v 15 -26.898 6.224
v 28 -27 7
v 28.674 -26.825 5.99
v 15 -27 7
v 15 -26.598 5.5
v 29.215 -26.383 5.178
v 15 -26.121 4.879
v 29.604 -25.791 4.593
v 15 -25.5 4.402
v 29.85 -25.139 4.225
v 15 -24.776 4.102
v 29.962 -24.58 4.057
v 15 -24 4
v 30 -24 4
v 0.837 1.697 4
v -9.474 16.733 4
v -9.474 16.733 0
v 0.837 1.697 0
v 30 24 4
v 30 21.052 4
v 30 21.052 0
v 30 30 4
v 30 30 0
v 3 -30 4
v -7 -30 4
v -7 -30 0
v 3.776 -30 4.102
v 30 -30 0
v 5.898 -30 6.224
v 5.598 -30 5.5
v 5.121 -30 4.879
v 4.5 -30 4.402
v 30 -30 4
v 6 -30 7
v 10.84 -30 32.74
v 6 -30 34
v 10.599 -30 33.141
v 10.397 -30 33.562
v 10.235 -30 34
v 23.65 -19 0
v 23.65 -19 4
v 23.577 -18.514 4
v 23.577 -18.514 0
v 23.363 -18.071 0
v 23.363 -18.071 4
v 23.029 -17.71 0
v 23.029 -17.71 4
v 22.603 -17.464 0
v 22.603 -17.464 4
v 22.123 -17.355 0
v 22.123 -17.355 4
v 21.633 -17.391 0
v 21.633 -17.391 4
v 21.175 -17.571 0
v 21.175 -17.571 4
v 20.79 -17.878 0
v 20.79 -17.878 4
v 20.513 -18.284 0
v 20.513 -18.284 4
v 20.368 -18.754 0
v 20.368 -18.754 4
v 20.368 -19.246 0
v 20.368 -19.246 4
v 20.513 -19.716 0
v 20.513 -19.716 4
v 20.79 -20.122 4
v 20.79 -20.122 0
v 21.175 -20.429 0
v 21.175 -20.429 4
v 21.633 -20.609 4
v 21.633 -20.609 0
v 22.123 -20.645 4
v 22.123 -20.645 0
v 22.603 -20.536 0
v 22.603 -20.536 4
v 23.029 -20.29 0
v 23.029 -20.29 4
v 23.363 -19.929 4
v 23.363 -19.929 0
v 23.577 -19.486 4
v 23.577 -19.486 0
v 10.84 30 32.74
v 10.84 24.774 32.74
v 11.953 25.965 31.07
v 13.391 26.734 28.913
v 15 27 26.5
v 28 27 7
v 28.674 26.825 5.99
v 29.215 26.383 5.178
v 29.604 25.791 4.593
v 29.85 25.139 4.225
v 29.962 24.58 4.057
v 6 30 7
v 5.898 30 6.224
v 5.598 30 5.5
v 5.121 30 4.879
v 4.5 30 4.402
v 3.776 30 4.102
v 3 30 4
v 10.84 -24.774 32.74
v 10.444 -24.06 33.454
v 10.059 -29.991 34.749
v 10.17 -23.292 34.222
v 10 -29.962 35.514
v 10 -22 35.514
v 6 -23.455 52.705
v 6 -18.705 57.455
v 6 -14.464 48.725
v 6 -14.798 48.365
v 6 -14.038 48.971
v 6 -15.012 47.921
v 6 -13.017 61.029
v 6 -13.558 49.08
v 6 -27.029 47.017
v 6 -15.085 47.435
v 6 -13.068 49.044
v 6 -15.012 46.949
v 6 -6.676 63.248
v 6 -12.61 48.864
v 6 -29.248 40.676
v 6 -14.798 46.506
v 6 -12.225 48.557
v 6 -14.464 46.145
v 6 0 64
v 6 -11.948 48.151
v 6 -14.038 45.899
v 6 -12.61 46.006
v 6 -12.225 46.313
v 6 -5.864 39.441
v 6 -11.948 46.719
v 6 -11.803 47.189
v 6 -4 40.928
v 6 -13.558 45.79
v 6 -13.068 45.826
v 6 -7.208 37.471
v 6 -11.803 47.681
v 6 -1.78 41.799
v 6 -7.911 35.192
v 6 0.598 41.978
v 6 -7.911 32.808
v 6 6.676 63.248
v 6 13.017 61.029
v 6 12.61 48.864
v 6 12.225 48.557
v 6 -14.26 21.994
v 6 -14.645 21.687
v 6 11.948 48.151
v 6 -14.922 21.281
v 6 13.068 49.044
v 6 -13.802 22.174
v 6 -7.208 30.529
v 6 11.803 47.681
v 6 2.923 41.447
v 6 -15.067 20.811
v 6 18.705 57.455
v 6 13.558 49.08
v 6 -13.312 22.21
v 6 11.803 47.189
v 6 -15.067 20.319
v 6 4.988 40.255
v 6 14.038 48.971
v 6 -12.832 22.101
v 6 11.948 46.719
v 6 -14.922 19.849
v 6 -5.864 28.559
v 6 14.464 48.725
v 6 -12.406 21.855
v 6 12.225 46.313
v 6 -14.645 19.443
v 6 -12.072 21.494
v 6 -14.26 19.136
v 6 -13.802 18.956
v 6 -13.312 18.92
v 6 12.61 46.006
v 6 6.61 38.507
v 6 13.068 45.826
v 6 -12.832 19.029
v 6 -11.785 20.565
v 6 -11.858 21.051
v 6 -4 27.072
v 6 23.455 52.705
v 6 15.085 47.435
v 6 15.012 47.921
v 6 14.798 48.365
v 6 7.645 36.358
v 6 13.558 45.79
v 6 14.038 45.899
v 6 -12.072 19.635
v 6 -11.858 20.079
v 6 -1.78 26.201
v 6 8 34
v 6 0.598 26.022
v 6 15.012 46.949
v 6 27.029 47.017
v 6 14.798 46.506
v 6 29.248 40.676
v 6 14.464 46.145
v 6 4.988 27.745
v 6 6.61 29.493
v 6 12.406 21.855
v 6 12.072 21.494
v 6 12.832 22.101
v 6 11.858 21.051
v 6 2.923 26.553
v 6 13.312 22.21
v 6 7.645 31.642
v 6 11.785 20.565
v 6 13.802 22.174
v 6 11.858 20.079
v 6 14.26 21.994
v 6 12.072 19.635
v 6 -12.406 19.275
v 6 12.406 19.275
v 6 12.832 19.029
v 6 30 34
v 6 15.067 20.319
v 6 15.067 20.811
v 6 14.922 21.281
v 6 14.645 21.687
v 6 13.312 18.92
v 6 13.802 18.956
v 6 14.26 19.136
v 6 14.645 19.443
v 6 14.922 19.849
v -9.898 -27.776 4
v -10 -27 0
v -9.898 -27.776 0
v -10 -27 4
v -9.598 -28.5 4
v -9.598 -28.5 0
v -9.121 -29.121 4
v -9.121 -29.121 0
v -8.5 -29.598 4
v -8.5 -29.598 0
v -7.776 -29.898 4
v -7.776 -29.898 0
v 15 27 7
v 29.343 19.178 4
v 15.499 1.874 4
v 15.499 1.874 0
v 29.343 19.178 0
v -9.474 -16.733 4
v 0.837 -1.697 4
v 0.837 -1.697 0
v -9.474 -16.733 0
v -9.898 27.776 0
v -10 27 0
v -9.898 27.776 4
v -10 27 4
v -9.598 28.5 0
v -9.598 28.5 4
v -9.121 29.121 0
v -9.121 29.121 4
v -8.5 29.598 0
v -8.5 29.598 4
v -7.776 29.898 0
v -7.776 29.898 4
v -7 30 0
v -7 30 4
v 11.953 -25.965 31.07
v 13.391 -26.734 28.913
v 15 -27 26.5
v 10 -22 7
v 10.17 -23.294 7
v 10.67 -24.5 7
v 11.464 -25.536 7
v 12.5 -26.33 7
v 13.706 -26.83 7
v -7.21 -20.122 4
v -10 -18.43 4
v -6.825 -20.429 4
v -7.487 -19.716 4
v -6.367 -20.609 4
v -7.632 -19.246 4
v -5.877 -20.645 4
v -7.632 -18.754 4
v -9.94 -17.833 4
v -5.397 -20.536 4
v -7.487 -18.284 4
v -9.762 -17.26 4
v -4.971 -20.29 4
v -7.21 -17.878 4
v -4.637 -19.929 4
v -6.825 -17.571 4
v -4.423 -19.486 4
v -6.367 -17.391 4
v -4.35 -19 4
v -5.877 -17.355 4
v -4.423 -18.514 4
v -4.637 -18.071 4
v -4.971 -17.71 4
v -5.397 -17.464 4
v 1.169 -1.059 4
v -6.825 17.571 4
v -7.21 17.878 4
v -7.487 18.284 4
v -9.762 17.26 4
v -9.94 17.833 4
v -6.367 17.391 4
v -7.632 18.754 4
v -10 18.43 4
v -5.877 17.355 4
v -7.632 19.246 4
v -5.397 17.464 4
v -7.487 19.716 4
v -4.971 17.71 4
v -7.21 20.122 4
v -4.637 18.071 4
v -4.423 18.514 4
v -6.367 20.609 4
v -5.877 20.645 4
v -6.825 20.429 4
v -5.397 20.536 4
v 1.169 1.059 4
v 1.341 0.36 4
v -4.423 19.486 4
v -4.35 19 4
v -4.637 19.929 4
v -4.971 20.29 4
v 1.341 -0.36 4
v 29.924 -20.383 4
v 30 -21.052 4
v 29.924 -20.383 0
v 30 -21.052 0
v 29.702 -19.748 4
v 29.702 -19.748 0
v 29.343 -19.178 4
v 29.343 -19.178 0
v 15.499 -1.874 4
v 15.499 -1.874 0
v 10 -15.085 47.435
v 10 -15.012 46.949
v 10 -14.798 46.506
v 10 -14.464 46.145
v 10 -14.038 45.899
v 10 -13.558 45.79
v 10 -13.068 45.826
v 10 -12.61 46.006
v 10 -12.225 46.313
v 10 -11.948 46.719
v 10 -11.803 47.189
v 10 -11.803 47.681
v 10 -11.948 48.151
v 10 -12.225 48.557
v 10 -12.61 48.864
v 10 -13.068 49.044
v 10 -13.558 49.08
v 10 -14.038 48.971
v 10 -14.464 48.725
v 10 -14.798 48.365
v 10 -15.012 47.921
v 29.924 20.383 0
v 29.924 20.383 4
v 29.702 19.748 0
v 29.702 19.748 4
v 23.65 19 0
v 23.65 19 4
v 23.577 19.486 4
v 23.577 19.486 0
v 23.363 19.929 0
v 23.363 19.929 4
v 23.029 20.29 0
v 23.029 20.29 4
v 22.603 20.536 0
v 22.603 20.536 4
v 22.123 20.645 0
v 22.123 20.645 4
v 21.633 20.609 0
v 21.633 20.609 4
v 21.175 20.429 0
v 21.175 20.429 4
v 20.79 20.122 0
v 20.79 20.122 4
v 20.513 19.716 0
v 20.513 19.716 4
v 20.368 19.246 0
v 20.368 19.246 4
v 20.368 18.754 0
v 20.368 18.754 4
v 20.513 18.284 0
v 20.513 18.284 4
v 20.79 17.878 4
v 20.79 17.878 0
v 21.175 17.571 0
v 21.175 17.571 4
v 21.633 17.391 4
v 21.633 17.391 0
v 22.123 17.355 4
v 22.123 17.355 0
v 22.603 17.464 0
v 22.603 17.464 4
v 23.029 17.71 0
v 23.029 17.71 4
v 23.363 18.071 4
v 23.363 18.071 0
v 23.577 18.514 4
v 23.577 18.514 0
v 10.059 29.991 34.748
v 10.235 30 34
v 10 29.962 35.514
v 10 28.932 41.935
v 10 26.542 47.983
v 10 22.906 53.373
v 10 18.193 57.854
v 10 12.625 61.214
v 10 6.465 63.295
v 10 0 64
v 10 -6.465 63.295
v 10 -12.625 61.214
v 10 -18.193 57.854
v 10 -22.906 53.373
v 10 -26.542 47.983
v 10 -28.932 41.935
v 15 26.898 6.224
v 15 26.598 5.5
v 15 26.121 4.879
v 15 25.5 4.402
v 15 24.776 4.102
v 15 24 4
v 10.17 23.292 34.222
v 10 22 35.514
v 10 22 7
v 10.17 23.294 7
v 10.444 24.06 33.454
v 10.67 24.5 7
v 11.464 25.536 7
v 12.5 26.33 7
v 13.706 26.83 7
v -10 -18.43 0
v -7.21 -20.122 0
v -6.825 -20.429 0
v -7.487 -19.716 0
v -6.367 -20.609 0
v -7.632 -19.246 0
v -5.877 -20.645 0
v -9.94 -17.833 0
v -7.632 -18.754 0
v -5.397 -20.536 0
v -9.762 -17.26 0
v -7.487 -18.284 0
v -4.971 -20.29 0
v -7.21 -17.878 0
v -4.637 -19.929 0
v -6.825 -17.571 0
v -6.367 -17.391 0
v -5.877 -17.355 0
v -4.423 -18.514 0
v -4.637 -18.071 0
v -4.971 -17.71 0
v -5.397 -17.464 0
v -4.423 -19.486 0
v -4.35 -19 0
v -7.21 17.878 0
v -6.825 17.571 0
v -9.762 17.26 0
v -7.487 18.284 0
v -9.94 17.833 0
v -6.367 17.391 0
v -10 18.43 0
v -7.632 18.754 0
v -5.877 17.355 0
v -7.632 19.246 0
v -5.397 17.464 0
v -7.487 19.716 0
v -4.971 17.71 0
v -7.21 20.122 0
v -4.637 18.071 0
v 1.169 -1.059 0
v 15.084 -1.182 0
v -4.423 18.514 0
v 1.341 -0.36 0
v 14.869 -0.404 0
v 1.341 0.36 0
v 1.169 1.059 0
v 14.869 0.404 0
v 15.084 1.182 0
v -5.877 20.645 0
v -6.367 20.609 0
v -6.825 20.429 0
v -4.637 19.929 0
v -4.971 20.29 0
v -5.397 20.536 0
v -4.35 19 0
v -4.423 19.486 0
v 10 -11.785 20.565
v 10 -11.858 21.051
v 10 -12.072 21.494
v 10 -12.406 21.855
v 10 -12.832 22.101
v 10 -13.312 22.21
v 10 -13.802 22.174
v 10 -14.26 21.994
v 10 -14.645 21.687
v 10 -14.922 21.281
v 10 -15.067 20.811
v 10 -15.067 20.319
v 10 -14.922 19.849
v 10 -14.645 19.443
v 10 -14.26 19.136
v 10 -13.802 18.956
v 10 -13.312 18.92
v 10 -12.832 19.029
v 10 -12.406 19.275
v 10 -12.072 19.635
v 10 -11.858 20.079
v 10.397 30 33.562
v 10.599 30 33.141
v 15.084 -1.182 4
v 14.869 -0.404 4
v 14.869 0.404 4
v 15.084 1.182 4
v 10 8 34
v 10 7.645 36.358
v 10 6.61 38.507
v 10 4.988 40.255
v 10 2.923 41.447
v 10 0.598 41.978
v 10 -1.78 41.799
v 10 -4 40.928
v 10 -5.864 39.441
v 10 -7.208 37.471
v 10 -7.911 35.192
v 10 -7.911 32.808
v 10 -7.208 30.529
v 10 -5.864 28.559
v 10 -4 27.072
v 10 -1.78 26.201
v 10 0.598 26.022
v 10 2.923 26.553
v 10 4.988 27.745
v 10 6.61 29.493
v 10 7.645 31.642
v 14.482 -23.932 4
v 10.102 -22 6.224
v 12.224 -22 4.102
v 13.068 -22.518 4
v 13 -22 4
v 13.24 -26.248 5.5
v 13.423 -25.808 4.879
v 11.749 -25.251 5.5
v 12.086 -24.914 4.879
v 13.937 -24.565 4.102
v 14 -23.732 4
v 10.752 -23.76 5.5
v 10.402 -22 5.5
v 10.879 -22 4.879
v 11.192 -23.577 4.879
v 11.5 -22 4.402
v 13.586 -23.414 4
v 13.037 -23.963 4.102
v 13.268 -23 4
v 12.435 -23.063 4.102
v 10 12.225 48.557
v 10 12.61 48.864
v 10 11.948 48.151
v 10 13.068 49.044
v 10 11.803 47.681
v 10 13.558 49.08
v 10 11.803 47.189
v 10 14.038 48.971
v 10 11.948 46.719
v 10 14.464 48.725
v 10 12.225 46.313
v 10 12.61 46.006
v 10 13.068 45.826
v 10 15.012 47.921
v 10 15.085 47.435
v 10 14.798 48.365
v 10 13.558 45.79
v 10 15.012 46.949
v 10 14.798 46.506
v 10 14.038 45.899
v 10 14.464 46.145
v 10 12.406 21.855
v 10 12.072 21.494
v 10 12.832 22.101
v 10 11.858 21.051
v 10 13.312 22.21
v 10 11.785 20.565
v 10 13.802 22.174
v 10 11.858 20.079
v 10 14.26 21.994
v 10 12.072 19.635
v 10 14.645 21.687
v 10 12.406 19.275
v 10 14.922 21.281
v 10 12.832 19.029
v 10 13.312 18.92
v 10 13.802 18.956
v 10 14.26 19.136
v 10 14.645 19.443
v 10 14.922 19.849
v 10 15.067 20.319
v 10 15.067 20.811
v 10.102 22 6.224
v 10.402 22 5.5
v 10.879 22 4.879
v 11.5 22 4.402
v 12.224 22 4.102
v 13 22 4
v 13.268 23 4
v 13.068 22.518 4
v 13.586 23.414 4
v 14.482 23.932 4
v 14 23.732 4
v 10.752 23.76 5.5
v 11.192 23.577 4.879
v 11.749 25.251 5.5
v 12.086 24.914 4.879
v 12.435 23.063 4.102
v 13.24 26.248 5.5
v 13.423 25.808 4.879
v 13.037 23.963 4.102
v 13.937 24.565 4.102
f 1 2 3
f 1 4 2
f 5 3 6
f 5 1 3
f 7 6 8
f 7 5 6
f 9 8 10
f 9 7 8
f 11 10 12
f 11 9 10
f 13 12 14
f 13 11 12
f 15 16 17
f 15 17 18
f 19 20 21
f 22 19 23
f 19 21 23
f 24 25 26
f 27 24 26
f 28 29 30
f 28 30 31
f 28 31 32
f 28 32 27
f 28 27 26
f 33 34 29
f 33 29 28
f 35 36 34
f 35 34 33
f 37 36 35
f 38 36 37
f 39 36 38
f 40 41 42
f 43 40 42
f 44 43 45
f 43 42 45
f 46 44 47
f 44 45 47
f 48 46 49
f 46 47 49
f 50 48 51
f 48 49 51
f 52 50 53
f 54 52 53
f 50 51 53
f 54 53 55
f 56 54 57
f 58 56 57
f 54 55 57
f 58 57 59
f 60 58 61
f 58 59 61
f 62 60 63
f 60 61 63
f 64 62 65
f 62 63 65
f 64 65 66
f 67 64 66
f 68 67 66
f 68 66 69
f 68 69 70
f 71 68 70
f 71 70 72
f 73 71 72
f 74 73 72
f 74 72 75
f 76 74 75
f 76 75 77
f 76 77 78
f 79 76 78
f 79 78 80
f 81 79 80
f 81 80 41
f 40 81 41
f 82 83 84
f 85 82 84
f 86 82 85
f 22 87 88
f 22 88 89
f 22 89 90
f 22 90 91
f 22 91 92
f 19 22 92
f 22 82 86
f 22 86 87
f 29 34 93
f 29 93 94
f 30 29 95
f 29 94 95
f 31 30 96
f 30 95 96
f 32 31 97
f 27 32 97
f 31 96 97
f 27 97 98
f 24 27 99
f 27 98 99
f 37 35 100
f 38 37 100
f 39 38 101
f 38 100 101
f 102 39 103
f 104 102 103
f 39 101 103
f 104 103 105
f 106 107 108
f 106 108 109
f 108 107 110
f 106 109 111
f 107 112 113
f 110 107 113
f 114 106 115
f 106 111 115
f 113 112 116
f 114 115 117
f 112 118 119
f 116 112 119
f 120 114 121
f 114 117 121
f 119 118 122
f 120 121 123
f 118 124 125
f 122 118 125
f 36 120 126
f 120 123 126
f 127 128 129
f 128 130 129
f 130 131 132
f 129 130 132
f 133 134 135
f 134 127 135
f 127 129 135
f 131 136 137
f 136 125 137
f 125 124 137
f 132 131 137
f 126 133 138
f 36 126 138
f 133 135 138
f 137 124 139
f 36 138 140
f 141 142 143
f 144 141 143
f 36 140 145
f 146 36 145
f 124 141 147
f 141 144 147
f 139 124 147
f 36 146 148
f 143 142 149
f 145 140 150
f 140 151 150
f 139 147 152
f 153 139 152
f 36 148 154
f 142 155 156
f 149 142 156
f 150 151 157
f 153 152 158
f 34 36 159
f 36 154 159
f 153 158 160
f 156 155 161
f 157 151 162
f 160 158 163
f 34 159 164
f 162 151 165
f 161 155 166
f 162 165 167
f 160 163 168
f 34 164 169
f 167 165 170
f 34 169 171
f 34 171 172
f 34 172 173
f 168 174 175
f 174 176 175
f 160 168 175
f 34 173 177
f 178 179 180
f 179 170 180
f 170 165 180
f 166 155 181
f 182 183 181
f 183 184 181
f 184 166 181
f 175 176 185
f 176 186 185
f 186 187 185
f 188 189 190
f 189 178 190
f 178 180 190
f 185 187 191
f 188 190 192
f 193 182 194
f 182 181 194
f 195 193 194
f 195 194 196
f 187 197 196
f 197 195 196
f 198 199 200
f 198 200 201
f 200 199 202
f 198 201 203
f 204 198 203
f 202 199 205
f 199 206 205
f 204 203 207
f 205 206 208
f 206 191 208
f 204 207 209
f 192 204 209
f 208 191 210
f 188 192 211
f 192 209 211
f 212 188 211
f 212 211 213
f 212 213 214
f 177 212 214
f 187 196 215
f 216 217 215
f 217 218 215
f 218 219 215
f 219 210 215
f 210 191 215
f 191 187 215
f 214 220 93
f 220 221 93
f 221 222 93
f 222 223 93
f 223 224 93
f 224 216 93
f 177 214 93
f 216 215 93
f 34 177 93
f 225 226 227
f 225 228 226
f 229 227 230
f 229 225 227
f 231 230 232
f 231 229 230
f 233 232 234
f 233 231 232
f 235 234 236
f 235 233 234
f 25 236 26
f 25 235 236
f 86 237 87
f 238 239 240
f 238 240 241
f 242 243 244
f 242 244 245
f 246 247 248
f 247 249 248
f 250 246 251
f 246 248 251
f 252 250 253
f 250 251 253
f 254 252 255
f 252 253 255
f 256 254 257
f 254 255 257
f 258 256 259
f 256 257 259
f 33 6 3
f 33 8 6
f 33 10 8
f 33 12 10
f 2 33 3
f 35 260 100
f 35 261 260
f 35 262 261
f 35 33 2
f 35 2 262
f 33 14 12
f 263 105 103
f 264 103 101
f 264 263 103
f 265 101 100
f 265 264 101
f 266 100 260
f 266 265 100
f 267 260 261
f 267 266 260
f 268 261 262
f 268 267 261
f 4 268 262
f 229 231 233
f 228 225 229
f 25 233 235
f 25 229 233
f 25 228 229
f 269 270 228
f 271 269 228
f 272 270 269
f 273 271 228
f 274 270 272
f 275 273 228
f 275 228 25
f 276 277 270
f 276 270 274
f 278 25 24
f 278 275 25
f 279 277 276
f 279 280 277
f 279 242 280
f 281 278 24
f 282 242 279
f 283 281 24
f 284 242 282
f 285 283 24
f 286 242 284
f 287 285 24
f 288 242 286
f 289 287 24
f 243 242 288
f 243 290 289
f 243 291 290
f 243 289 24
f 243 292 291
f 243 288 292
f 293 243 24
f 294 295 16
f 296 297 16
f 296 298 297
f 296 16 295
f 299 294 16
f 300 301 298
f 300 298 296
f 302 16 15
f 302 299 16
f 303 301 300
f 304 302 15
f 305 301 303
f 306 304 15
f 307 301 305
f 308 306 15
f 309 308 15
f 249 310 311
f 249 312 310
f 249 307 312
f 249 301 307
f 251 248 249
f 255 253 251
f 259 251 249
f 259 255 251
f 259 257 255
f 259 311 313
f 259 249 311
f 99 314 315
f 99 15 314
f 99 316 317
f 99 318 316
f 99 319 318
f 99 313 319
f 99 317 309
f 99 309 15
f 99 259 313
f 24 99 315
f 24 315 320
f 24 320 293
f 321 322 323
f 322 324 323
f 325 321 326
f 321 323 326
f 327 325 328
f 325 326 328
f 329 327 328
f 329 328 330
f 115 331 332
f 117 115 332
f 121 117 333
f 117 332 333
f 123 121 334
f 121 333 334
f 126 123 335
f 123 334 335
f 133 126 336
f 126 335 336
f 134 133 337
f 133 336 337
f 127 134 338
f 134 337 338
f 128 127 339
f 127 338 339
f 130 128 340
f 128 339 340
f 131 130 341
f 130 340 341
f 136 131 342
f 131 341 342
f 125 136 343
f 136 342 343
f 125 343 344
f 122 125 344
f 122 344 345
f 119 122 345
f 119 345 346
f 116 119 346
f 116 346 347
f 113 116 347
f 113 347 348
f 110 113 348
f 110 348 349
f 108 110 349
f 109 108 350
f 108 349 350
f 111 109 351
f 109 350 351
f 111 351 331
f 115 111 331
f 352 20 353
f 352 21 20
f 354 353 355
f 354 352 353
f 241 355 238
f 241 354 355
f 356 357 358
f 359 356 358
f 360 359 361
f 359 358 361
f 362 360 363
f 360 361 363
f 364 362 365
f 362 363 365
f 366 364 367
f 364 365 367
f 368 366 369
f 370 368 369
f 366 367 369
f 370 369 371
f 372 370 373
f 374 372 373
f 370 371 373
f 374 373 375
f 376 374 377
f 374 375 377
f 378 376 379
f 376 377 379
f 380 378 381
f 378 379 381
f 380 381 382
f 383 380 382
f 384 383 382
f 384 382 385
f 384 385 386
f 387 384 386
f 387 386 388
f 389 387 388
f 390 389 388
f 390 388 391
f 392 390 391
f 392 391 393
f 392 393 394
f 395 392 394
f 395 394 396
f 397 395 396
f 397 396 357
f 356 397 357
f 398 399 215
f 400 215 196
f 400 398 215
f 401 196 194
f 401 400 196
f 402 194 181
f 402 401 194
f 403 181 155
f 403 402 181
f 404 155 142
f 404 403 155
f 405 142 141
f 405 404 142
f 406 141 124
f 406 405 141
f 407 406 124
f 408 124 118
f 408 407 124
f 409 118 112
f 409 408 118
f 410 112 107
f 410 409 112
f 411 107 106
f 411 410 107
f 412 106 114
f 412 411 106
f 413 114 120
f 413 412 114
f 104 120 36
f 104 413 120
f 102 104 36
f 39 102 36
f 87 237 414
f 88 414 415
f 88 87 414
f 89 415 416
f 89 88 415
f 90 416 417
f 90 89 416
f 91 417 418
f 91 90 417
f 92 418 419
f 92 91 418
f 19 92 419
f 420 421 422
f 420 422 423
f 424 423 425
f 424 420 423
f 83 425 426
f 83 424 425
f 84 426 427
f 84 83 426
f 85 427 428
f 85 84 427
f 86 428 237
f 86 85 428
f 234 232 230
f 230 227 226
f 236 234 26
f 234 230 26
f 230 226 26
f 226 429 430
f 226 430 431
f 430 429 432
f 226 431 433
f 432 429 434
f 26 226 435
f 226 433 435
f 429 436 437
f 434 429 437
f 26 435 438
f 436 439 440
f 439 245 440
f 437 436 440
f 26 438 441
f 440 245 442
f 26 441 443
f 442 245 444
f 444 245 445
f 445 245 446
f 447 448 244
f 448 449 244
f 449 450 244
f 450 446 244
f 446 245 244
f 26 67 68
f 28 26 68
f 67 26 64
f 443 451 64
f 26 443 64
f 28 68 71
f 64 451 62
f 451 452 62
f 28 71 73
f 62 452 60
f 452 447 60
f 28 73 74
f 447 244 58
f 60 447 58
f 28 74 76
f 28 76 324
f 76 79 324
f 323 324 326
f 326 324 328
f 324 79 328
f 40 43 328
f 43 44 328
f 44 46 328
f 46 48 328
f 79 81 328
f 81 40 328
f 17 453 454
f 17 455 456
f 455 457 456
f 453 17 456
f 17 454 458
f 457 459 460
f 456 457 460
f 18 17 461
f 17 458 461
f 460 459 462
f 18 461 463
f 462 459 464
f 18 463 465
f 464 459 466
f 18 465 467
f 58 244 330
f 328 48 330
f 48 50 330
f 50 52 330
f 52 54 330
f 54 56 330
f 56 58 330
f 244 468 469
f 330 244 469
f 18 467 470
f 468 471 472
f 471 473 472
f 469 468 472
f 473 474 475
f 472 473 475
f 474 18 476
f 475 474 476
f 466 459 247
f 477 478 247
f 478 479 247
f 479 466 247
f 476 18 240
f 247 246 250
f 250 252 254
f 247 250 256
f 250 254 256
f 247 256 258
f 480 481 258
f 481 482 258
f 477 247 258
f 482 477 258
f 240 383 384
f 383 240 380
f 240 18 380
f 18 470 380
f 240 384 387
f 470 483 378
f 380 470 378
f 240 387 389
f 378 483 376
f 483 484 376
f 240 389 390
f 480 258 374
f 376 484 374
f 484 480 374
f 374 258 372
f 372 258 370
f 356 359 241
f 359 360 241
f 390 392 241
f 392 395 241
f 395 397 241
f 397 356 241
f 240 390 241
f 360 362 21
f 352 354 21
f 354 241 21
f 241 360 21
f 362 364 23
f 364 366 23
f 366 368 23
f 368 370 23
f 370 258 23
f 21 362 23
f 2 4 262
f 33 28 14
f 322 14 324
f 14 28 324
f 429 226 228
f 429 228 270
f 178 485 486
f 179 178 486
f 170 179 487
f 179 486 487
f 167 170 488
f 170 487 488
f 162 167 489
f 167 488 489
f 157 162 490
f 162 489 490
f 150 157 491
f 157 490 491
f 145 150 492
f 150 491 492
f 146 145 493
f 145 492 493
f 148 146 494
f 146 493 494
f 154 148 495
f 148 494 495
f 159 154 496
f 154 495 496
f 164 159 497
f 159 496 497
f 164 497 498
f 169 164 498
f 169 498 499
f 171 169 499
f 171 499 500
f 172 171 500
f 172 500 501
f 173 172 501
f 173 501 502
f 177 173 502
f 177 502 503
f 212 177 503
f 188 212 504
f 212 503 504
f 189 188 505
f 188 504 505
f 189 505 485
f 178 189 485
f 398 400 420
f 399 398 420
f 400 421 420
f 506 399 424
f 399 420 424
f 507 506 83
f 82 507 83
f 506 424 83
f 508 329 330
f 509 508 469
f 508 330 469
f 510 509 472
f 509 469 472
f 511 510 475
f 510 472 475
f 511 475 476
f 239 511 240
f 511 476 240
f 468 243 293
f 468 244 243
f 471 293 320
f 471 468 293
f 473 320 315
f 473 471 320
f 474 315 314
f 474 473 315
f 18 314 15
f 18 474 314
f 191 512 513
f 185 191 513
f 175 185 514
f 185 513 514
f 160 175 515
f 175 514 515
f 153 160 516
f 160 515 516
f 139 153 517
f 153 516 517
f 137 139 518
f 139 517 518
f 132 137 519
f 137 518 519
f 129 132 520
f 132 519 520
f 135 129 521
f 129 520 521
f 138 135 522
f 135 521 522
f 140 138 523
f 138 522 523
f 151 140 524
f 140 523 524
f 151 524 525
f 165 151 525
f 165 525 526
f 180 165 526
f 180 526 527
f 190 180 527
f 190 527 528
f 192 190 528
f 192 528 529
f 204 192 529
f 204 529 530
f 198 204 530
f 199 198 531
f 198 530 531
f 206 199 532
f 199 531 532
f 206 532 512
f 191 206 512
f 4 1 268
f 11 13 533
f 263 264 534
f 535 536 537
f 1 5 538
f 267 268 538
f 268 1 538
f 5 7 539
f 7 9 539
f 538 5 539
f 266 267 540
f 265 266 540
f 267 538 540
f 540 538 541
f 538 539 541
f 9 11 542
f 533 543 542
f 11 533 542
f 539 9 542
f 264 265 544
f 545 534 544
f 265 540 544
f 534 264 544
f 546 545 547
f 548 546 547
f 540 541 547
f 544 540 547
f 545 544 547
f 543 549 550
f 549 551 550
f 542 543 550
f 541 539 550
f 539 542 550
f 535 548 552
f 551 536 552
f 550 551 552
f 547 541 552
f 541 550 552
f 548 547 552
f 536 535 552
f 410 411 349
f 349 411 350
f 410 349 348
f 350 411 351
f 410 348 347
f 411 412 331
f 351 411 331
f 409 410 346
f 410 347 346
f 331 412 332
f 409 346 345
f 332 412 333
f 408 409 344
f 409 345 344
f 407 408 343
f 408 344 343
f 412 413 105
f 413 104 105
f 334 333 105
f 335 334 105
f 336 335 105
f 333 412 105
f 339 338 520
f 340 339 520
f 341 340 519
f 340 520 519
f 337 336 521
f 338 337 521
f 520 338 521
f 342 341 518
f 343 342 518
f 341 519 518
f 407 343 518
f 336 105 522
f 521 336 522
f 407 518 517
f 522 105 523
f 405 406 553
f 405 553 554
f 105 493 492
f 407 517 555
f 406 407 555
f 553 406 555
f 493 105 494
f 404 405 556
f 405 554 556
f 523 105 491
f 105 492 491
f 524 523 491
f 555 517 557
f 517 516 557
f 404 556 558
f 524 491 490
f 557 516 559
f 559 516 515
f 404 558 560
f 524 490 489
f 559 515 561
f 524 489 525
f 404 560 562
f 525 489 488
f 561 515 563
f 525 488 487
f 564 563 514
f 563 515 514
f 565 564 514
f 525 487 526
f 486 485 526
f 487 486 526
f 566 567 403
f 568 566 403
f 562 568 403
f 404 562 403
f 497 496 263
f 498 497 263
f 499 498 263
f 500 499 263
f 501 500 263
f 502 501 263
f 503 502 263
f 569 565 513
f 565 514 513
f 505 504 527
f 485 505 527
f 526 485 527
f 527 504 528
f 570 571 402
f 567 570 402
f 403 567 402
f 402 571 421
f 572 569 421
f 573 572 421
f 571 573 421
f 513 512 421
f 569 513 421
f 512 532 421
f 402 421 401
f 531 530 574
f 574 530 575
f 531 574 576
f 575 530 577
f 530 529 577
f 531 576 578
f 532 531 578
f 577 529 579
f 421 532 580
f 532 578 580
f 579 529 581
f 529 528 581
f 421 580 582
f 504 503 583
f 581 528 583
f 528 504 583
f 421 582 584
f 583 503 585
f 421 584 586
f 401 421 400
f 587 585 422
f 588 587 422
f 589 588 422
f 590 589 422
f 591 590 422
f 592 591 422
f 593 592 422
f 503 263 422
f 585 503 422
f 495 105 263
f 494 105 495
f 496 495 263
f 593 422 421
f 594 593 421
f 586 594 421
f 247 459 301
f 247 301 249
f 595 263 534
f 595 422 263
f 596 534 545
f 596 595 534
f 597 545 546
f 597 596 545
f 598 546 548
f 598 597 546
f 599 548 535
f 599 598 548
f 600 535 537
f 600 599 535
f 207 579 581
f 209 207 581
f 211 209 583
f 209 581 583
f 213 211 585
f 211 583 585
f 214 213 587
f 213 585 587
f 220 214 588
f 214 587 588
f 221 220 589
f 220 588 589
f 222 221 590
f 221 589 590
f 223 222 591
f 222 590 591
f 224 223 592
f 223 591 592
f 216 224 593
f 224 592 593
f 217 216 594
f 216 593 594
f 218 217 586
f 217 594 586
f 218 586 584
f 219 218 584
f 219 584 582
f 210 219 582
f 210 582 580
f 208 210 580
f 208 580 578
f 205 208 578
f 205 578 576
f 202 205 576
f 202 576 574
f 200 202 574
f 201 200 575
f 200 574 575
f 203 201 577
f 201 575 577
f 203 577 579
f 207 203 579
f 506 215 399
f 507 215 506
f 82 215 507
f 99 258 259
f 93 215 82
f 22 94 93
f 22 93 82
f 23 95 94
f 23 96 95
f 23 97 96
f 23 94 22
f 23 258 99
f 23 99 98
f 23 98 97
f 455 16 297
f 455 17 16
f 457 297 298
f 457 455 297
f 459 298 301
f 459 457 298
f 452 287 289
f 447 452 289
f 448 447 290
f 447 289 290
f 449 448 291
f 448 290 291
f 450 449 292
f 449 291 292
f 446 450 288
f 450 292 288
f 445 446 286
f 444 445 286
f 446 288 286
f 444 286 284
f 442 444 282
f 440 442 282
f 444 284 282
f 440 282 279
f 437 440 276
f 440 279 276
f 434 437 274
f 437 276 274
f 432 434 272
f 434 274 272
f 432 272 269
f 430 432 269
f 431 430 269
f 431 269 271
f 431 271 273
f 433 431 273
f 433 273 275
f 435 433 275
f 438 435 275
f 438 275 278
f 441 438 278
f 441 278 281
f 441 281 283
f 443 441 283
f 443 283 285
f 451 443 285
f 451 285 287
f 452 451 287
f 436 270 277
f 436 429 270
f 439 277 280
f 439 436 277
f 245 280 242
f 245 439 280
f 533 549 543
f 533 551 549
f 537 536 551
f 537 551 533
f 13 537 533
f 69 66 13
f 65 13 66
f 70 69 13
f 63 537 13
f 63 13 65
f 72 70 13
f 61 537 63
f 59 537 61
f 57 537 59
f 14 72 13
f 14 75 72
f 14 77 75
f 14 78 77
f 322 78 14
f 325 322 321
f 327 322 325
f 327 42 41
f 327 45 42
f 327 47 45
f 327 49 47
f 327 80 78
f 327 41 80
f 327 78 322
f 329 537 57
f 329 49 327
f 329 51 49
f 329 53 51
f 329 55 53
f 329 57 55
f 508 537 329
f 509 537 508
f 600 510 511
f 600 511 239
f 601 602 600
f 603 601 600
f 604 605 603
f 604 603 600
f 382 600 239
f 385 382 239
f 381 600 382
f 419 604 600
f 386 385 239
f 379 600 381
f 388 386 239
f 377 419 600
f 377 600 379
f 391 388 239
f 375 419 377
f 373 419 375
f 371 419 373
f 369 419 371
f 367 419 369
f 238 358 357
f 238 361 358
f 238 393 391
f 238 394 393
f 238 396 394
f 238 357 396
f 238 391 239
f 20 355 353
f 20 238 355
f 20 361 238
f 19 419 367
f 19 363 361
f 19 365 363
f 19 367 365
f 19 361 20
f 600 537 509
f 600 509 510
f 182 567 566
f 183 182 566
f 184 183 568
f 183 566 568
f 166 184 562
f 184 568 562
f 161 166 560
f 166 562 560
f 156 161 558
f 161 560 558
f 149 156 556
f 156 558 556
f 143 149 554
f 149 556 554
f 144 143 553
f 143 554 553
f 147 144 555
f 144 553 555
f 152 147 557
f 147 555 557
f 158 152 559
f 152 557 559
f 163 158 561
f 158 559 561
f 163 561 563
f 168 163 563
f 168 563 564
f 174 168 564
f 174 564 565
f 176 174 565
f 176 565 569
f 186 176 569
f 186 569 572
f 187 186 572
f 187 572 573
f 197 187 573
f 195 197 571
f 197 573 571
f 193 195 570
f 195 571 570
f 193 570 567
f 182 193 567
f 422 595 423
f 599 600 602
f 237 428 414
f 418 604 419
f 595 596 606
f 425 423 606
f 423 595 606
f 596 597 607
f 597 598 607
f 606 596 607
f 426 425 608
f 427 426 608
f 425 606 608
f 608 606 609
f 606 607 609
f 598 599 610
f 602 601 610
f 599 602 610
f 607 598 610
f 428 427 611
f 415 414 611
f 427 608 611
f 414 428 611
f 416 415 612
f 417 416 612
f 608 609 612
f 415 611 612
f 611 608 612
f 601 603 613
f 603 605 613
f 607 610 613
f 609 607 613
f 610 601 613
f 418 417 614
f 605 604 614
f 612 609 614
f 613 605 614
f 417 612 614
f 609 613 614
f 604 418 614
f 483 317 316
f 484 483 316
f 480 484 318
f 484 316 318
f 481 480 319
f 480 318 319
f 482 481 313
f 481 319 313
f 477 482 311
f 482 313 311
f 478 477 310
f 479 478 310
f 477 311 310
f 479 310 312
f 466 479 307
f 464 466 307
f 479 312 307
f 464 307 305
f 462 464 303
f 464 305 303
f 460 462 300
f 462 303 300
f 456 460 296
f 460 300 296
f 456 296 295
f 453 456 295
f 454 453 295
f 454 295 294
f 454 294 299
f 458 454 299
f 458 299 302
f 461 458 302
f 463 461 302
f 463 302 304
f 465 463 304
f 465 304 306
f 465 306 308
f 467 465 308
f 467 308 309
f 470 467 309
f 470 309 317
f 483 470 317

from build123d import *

# Parameters (mm, degrees)
SKETCH_3_W          = 20
SKETCH_3_H          = 60
EXTRUDE_2_DEPTH     = 4
SKETCH_4_R          = 8
SKETCH_4_R_2        = 1.65
EXTRUDE_3_DEPTH     = 4
SKETCH_9_W          = 20
SKETCH_9_H          = 60
EXTRUDE_6_DEPTH     = 4
EXTRUDE_4_DEPTH     = 3
EXTRUDE_7_DEPTH     = 3
SKETCH_7_R          = 1.65
CUT_EXTRUDE_1_DEPTH = 74.484692283
FILLET_1_R          = 5
FILLET_2_R          = 3
FILLET_3_R          = 3


with BuildPart() as part:
    # 草图3 → 凸台-拉伸2 (new body)
    with BuildSketch(Plane.XY):
        Rectangle(SKETCH_3_W, SKETCH_3_H)
    extrude(amount=EXTRUDE_2_DEPTH)

    # 草图4 → 凸台-拉伸3 (add)
    with BuildSketch(Plane(origin=(10, 0, 0), x_dir=(0, 0, -1), z_dir=(1, 0, 0))):
        with BuildLine():
            Line((0, 30), (-34, 30))
            ThreePointArc((-34, 30), (-64, 0), (-34, -30))
            Line((-34, -30), (0, -30))
            Line((0, -30), (0, 30))
        make_face()
        with Locations(Location((-34, 0, 0), (0, 0, 90))):
            Circle(SKETCH_4_R, mode=Mode.SUBTRACT)
        with Locations(Location((-47.435028843, 13.435028843, 0), (0, 0, 90))):
            Circle(SKETCH_4_R_2, mode=Mode.SUBTRACT)
        with Locations(Location((-20.564971157, 13.435028843, 0), (0, 0, 270))):
            Circle(SKETCH_4_R_2, mode=Mode.SUBTRACT)
        with Locations(Location((-20.564971157, -13.435028843, 0), (0, 0, 90))):
            Circle(SKETCH_4_R_2, mode=Mode.SUBTRACT)
        with Locations(Location((-47.435028843, -13.435028843, 0), (0, 0, 270))):
            Circle(SKETCH_4_R_2, mode=Mode.SUBTRACT)
    extrude(amount=-EXTRUDE_3_DEPTH)

    # 草图9 → 凸台-拉伸6 (add)
    with BuildSketch(Plane.XY):
        with Locations((20, 0)):
            Rectangle(SKETCH_9_W, SKETCH_9_H)
    extrude(amount=EXTRUDE_6_DEPTH)

    # 草图5 → 凸台-拉伸4 (add)
    with BuildSketch(Plane(origin=(0, 30, 0), x_dir=(1, 0, 0), z_dir=(0, 1, 0))):
        Polygon((10, -34), (30, -4), (10, -4), align=None)
    extrude(amount=-EXTRUDE_4_DEPTH)

    # 草图11 → 凸台-拉伸7 (add)
    with BuildSketch(Plane.XZ.offset(30)):
        Polygon((10, 34), (10, 4), (30, 4), align=None)
    extrude(amount=-EXTRUDE_7_DEPTH)

    # 草图7 → 切除-拉伸1 (cut, through all)
    with BuildSketch(Plane.XY.offset(4)):
        with Locations((-6, 19)):
            Circle(SKETCH_7_R)
        with Locations((22, 19)):
            Circle(SKETCH_7_R)
        with Locations((22, -19)):
            Circle(SKETCH_7_R)
        with Locations((-6, -19)):
            Circle(SKETCH_7_R)
        Polygon((-10, 17.5), (2, 0), (-10, -17.5), align=None)
        Polygon((14, 0), (30, 20), (30, -20), align=None)
    extrude(amount=-CUT_EXTRUDE_1_DEPTH, mode=Mode.SUBTRACT)

    # 圆角1
    fillet_1_edges = [part.edges().sort_by_distance(p)[0] for p in [
        (10, 27, 19),
        (10, 28.5, 34),
        (10, -28.5, 34),
        (10, -27, 19),
    ]]
    fillet(fillet_1_edges, radius=FILLET_1_R)

    # 圆角2
    fillet_2_edges = [part.edges().sort_by_distance(p)[0] for p in [
        (-10, -17.5, 2),
        (-10, 17.5, 2),
        (2, 0, 2),
        (30, -20, 2),
        (14, 0, 2),
        (30, 20, 2),
        (10, 0, 4),
        (22.5, -27, 4),
        (11.464466094, 25.535533906, 4),
        (11.464466094, -25.535533906, 4),
        (22.5, 27, 4),
    ]]
    fillet(fillet_2_edges, radius=FILLET_2_R)

    # 圆角3
    fillet_3_edges = [part.edges().sort_by_distance(p)[0] for p in [
        (6, 0, 4),
        (-10, 30, 2),
        (-10, -30, 2),
    ]]
    fillet(fillet_3_edges, radius=FILLET_3_R)


solid = part.part
